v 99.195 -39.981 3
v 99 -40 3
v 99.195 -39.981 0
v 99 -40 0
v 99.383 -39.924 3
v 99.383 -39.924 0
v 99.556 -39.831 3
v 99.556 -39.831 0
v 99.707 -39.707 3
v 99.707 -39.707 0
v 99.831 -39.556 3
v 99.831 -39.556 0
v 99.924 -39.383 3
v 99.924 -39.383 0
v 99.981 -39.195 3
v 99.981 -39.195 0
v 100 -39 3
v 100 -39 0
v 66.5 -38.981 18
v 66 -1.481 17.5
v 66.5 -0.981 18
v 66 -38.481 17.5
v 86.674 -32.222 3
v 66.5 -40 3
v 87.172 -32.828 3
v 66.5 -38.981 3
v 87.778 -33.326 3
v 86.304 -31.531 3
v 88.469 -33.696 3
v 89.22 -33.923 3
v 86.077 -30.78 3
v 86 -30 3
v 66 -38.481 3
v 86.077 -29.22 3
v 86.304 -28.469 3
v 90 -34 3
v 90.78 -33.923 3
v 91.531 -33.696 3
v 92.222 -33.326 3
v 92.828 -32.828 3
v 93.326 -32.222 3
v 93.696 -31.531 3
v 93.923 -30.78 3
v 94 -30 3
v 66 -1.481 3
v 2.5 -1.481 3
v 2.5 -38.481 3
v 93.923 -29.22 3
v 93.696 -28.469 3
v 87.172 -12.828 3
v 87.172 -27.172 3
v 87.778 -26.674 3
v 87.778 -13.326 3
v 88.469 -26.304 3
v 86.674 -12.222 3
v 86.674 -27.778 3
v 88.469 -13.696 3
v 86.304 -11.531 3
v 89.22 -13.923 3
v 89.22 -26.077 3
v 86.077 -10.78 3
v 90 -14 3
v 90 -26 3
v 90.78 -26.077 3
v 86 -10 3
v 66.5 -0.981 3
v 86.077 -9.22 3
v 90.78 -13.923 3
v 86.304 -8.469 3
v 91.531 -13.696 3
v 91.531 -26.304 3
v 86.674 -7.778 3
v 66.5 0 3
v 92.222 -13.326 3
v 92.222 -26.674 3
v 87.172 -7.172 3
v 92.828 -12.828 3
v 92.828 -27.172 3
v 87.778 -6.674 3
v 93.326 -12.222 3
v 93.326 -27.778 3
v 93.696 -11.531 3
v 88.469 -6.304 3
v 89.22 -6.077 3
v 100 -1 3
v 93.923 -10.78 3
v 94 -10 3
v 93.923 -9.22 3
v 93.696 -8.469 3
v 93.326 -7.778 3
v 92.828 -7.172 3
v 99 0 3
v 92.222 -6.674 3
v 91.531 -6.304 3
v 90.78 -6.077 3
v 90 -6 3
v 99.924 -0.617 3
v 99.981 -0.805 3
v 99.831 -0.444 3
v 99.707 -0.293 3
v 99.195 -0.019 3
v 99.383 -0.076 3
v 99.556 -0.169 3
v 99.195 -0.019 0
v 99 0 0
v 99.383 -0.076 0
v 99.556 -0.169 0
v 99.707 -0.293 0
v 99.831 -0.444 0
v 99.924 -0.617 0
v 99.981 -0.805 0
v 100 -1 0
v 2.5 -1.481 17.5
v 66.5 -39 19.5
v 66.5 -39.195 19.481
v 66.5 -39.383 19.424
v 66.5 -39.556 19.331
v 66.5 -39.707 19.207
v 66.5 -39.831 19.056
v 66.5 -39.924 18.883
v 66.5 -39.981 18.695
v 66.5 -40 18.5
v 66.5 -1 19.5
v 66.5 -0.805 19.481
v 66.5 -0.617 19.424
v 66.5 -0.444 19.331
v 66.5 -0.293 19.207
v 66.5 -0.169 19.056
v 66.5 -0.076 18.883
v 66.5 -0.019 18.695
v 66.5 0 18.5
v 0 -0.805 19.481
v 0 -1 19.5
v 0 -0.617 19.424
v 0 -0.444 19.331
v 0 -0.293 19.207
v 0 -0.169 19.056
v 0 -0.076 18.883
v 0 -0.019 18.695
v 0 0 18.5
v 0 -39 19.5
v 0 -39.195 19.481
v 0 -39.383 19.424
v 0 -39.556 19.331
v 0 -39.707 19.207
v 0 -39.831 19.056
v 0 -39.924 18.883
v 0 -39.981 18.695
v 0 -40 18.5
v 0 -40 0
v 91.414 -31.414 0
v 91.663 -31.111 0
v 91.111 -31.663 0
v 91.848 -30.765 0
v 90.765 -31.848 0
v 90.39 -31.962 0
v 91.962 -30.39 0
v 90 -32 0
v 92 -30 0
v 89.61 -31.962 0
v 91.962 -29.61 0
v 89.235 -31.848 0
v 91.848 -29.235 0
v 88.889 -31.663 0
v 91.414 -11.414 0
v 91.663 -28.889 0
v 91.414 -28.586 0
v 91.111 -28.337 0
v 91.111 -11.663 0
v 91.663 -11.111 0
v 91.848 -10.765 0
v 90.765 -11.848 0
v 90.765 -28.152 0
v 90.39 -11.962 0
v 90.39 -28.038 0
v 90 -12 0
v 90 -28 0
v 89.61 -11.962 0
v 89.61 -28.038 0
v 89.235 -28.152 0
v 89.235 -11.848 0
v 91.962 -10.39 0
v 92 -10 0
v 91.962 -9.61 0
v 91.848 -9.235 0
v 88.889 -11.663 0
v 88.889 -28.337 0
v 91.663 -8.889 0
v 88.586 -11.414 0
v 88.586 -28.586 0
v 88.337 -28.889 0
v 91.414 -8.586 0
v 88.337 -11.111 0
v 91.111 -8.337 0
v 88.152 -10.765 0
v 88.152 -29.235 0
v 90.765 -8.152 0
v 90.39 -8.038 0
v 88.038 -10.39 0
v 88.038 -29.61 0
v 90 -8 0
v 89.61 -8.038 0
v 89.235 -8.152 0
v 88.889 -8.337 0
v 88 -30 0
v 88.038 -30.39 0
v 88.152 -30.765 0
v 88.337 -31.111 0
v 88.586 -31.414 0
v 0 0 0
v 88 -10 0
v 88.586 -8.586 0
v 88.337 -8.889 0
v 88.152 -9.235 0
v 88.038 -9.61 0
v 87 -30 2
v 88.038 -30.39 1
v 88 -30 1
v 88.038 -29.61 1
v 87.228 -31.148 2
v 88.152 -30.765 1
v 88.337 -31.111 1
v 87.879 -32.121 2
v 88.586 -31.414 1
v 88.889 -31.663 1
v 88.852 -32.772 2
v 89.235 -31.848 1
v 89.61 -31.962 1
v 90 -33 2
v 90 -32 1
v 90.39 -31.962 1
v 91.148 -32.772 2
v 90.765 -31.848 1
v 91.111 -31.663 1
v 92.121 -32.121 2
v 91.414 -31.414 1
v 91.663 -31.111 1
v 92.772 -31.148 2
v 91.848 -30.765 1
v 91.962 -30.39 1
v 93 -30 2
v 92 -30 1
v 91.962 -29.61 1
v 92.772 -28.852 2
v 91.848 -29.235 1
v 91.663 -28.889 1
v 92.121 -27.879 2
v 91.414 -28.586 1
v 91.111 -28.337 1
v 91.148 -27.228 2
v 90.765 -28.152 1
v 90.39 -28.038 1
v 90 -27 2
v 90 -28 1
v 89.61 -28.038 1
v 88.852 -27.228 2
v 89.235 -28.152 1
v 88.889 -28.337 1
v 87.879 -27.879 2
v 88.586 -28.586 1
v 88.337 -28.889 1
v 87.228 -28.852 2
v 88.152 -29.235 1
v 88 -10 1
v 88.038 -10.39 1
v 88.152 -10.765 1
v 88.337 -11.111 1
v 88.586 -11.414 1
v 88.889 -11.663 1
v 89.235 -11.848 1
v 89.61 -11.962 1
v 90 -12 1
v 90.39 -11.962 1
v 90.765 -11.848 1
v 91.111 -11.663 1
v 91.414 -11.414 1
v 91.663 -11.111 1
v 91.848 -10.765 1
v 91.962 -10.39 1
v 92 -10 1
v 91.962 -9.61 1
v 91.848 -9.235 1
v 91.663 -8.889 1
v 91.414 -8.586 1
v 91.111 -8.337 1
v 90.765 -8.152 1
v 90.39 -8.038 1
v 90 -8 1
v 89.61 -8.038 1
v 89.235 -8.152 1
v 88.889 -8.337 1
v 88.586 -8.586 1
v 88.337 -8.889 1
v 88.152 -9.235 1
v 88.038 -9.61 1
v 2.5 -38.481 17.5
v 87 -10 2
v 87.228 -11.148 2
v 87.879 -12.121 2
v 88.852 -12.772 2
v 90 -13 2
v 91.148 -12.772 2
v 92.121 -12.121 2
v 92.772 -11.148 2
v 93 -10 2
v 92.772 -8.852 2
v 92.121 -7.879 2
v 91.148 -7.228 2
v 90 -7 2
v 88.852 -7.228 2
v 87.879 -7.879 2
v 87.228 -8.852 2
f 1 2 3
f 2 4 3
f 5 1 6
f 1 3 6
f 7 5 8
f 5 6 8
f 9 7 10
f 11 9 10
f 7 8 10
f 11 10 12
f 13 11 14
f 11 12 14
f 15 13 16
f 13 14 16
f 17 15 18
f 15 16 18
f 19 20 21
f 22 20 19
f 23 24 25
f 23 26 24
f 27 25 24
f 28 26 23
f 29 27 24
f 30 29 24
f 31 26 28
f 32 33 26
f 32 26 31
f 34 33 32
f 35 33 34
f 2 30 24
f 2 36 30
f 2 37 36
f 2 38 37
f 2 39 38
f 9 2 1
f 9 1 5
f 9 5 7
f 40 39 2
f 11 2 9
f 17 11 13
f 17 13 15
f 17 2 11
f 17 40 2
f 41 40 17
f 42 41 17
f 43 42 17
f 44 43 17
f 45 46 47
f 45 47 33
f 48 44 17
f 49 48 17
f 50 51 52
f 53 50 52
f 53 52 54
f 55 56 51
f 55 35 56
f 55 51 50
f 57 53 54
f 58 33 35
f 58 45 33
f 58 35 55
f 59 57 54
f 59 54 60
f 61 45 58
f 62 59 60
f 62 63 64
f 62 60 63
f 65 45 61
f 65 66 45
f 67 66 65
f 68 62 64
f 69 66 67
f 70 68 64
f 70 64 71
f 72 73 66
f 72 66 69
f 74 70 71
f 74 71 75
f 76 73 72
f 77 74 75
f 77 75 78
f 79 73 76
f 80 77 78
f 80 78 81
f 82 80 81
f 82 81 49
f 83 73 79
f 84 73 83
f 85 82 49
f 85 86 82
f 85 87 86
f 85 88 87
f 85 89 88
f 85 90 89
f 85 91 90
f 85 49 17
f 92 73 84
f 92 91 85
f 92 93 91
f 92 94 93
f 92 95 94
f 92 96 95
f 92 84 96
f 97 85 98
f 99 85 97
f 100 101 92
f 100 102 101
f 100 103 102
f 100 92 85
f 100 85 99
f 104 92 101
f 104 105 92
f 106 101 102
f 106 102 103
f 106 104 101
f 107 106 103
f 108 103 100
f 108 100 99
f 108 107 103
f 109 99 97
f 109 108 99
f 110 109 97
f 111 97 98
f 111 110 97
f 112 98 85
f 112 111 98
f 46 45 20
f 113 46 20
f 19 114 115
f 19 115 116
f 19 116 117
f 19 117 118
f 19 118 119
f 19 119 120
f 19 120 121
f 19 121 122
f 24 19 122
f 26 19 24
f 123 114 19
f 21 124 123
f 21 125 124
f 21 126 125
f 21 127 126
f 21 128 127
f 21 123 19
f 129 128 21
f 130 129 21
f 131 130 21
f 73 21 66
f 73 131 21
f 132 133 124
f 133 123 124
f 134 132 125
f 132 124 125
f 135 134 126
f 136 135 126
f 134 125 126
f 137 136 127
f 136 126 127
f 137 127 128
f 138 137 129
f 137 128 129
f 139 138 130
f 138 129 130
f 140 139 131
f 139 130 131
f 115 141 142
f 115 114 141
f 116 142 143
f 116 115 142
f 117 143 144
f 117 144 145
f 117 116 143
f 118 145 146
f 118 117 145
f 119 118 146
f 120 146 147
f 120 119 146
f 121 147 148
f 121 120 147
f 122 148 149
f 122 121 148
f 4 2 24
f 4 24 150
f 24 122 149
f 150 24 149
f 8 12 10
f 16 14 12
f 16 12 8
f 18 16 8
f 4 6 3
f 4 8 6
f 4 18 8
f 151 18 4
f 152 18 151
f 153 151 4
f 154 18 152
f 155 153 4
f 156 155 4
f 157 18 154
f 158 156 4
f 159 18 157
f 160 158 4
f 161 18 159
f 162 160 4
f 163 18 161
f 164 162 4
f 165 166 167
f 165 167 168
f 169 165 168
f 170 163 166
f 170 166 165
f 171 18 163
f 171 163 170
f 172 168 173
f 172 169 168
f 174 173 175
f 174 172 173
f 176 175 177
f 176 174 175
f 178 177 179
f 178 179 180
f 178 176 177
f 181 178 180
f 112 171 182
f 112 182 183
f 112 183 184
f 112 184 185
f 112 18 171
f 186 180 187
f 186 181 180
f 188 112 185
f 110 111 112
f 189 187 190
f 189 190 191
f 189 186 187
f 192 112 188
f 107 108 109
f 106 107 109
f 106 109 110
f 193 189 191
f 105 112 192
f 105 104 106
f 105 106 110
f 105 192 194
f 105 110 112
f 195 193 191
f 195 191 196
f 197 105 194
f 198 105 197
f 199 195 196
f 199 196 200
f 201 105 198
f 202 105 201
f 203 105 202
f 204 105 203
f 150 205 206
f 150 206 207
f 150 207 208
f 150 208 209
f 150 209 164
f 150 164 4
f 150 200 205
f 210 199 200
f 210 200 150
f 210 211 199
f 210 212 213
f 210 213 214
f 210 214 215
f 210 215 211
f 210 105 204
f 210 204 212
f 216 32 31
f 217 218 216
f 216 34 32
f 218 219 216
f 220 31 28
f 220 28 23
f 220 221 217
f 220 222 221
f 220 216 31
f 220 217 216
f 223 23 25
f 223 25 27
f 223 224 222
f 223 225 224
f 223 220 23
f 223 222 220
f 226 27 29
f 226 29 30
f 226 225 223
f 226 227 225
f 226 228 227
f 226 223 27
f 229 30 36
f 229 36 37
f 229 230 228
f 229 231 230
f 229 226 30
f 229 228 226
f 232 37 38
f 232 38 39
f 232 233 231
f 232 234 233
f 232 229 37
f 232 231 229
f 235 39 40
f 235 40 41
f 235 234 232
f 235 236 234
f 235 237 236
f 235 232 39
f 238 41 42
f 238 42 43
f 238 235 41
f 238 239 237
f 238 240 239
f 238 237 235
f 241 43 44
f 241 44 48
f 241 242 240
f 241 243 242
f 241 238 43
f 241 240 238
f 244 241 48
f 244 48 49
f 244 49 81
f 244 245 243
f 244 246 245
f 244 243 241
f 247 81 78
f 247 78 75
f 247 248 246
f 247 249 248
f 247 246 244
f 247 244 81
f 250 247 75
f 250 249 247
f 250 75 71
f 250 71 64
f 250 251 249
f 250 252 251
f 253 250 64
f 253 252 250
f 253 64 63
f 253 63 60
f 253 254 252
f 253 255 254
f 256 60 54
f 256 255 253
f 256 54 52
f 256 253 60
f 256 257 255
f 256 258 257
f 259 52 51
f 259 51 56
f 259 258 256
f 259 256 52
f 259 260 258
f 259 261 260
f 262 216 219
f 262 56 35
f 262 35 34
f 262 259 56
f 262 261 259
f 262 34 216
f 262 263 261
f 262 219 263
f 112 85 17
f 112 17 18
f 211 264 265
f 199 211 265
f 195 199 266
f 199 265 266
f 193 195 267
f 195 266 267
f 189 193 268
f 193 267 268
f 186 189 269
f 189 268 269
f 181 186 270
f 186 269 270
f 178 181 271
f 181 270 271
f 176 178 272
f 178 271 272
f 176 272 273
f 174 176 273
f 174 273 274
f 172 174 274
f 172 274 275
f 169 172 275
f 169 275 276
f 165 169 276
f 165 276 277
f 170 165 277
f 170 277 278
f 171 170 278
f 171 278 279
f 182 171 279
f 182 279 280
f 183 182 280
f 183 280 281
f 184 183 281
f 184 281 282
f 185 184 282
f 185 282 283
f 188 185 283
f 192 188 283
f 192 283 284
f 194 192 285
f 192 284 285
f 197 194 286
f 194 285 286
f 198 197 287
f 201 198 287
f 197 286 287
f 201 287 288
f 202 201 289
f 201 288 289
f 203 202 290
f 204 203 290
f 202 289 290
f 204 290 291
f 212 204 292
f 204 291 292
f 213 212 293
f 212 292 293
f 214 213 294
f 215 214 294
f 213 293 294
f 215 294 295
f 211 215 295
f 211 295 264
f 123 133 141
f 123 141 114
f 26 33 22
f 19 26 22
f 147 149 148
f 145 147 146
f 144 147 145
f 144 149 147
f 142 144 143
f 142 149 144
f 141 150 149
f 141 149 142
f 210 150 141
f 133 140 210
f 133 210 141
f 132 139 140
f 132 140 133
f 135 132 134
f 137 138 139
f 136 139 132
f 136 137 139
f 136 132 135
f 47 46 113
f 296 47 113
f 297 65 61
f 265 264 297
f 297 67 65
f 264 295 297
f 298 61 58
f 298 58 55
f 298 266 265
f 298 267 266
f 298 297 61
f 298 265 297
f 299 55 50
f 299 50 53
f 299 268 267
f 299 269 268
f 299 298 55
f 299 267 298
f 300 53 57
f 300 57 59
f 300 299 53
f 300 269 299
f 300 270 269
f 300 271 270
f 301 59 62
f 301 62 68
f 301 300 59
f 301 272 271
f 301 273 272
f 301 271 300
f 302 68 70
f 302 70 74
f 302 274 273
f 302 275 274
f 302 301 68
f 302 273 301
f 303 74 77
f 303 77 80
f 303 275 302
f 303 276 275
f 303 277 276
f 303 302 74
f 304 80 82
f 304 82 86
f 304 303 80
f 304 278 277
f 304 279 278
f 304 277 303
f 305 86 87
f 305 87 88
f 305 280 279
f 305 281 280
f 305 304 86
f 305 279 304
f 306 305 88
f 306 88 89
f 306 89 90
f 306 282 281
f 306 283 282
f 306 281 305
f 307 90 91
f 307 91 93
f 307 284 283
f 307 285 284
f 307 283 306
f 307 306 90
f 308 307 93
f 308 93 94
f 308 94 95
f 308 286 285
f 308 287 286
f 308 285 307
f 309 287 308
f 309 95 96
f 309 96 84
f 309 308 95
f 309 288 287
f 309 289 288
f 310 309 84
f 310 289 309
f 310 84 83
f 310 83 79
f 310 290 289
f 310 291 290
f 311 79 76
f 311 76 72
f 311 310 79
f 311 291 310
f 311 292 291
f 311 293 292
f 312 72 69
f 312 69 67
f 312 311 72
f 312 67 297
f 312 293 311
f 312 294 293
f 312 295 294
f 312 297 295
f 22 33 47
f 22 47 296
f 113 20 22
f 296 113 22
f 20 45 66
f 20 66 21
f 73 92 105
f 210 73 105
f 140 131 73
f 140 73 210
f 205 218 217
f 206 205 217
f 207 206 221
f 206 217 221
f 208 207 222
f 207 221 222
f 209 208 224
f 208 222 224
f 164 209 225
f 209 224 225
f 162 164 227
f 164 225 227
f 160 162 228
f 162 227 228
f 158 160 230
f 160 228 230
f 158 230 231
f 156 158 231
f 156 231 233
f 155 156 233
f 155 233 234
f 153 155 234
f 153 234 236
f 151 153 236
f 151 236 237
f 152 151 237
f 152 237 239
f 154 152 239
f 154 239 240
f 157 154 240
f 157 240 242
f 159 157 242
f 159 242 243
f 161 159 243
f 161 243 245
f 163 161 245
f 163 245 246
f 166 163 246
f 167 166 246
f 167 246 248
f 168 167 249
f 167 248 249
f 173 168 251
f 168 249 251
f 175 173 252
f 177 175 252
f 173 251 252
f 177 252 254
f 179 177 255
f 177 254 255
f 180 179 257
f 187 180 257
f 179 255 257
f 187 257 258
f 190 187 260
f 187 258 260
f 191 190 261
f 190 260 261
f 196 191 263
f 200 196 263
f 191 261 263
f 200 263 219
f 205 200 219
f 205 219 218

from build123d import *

# Parameters (mm, degrees)
PAD_DEPTH       = 40
SKETCH001_W     = 14.5
SKETCH001_H     = 37
POCKET_DEPTH    = 64
SKETCH002_R     = 2
POCKET001_DEPTH = 5
FILLET_R        = 1
FILLET001_R     = 1
CHAMFER_SIZE    = 0.5
CHAMFER001_SIZE = 2


with BuildPart() as part:
    # Sketch → Pad (new body)
    with BuildSketch(Plane.XZ):
        Polygon((0, 0), (0, 19.5), (66.5, 19.5), (66.5, 3), (100, 3), (100, 0), align=None)
    extrude(amount=PAD_DEPTH)

    # Sketch001 (on Face3 of Pad) → Pocket (cut)
    with BuildSketch(Plane(origin=(66.5, 0, 0), x_dir=(0, 0, 1), z_dir=(1, 0, 0))):
        with Locations((10.25, 19.980706)):
            Rectangle(SKETCH001_W, SKETCH001_H)
    extrude(amount=-POCKET_DEPTH, mode=Mode.SUBTRACT)

    # Sketch002 (on Face12 of Pocket) → Pocket001 (cut)
    with BuildSketch(Plane(origin=(0, 0, 3), x_dir=(-1, 0, 0), z_dir=(0, 0, 1))):
        with Locations((-90, 30)):
            Circle(SKETCH002_R)
        with Locations((-90, 10)):
            Circle(SKETCH002_R)
    extrude(amount=-POCKET001_DEPTH, mode=Mode.SUBTRACT)

    # Fillet
    fillet_edges = [part.edges().sort_by_distance(p)[0] for p in [
        (33.25, 0, 19.5),
        (33.25, -40, 19.5),
    ]]
    fillet(fillet_edges, radius=FILLET_R)

    # Fillet001
    fillet001_edges = [part.edges().sort_by_distance(p)[0] for p in [
        (100, 0, 1.5),
        (100, -40, 1.5),
    ]]
    fillet(fillet001_edges, radius=FILLET001_R)

    # Chamfer
    chamfer_edges = [part.edges().sort_by_distance(p)[0] for p in [
        (66.5, -38.480706, 10.25),
        (66.5, -19.980706, 17.5),
        (66.5, -1.480706, 10.25),
    ]]
    chamfer(chamfer_edges, length=CHAMFER_SIZE)

    # Chamfer001
    chamfer001_edges = [part.edges().sort_by_distance(p)[0] for p in [
        (92, -10, 3),
        (92, -30, 3),
    ]]
    chamfer(chamfer001_edges, length=CHAMFER001_SIZE)


solid = part.part
